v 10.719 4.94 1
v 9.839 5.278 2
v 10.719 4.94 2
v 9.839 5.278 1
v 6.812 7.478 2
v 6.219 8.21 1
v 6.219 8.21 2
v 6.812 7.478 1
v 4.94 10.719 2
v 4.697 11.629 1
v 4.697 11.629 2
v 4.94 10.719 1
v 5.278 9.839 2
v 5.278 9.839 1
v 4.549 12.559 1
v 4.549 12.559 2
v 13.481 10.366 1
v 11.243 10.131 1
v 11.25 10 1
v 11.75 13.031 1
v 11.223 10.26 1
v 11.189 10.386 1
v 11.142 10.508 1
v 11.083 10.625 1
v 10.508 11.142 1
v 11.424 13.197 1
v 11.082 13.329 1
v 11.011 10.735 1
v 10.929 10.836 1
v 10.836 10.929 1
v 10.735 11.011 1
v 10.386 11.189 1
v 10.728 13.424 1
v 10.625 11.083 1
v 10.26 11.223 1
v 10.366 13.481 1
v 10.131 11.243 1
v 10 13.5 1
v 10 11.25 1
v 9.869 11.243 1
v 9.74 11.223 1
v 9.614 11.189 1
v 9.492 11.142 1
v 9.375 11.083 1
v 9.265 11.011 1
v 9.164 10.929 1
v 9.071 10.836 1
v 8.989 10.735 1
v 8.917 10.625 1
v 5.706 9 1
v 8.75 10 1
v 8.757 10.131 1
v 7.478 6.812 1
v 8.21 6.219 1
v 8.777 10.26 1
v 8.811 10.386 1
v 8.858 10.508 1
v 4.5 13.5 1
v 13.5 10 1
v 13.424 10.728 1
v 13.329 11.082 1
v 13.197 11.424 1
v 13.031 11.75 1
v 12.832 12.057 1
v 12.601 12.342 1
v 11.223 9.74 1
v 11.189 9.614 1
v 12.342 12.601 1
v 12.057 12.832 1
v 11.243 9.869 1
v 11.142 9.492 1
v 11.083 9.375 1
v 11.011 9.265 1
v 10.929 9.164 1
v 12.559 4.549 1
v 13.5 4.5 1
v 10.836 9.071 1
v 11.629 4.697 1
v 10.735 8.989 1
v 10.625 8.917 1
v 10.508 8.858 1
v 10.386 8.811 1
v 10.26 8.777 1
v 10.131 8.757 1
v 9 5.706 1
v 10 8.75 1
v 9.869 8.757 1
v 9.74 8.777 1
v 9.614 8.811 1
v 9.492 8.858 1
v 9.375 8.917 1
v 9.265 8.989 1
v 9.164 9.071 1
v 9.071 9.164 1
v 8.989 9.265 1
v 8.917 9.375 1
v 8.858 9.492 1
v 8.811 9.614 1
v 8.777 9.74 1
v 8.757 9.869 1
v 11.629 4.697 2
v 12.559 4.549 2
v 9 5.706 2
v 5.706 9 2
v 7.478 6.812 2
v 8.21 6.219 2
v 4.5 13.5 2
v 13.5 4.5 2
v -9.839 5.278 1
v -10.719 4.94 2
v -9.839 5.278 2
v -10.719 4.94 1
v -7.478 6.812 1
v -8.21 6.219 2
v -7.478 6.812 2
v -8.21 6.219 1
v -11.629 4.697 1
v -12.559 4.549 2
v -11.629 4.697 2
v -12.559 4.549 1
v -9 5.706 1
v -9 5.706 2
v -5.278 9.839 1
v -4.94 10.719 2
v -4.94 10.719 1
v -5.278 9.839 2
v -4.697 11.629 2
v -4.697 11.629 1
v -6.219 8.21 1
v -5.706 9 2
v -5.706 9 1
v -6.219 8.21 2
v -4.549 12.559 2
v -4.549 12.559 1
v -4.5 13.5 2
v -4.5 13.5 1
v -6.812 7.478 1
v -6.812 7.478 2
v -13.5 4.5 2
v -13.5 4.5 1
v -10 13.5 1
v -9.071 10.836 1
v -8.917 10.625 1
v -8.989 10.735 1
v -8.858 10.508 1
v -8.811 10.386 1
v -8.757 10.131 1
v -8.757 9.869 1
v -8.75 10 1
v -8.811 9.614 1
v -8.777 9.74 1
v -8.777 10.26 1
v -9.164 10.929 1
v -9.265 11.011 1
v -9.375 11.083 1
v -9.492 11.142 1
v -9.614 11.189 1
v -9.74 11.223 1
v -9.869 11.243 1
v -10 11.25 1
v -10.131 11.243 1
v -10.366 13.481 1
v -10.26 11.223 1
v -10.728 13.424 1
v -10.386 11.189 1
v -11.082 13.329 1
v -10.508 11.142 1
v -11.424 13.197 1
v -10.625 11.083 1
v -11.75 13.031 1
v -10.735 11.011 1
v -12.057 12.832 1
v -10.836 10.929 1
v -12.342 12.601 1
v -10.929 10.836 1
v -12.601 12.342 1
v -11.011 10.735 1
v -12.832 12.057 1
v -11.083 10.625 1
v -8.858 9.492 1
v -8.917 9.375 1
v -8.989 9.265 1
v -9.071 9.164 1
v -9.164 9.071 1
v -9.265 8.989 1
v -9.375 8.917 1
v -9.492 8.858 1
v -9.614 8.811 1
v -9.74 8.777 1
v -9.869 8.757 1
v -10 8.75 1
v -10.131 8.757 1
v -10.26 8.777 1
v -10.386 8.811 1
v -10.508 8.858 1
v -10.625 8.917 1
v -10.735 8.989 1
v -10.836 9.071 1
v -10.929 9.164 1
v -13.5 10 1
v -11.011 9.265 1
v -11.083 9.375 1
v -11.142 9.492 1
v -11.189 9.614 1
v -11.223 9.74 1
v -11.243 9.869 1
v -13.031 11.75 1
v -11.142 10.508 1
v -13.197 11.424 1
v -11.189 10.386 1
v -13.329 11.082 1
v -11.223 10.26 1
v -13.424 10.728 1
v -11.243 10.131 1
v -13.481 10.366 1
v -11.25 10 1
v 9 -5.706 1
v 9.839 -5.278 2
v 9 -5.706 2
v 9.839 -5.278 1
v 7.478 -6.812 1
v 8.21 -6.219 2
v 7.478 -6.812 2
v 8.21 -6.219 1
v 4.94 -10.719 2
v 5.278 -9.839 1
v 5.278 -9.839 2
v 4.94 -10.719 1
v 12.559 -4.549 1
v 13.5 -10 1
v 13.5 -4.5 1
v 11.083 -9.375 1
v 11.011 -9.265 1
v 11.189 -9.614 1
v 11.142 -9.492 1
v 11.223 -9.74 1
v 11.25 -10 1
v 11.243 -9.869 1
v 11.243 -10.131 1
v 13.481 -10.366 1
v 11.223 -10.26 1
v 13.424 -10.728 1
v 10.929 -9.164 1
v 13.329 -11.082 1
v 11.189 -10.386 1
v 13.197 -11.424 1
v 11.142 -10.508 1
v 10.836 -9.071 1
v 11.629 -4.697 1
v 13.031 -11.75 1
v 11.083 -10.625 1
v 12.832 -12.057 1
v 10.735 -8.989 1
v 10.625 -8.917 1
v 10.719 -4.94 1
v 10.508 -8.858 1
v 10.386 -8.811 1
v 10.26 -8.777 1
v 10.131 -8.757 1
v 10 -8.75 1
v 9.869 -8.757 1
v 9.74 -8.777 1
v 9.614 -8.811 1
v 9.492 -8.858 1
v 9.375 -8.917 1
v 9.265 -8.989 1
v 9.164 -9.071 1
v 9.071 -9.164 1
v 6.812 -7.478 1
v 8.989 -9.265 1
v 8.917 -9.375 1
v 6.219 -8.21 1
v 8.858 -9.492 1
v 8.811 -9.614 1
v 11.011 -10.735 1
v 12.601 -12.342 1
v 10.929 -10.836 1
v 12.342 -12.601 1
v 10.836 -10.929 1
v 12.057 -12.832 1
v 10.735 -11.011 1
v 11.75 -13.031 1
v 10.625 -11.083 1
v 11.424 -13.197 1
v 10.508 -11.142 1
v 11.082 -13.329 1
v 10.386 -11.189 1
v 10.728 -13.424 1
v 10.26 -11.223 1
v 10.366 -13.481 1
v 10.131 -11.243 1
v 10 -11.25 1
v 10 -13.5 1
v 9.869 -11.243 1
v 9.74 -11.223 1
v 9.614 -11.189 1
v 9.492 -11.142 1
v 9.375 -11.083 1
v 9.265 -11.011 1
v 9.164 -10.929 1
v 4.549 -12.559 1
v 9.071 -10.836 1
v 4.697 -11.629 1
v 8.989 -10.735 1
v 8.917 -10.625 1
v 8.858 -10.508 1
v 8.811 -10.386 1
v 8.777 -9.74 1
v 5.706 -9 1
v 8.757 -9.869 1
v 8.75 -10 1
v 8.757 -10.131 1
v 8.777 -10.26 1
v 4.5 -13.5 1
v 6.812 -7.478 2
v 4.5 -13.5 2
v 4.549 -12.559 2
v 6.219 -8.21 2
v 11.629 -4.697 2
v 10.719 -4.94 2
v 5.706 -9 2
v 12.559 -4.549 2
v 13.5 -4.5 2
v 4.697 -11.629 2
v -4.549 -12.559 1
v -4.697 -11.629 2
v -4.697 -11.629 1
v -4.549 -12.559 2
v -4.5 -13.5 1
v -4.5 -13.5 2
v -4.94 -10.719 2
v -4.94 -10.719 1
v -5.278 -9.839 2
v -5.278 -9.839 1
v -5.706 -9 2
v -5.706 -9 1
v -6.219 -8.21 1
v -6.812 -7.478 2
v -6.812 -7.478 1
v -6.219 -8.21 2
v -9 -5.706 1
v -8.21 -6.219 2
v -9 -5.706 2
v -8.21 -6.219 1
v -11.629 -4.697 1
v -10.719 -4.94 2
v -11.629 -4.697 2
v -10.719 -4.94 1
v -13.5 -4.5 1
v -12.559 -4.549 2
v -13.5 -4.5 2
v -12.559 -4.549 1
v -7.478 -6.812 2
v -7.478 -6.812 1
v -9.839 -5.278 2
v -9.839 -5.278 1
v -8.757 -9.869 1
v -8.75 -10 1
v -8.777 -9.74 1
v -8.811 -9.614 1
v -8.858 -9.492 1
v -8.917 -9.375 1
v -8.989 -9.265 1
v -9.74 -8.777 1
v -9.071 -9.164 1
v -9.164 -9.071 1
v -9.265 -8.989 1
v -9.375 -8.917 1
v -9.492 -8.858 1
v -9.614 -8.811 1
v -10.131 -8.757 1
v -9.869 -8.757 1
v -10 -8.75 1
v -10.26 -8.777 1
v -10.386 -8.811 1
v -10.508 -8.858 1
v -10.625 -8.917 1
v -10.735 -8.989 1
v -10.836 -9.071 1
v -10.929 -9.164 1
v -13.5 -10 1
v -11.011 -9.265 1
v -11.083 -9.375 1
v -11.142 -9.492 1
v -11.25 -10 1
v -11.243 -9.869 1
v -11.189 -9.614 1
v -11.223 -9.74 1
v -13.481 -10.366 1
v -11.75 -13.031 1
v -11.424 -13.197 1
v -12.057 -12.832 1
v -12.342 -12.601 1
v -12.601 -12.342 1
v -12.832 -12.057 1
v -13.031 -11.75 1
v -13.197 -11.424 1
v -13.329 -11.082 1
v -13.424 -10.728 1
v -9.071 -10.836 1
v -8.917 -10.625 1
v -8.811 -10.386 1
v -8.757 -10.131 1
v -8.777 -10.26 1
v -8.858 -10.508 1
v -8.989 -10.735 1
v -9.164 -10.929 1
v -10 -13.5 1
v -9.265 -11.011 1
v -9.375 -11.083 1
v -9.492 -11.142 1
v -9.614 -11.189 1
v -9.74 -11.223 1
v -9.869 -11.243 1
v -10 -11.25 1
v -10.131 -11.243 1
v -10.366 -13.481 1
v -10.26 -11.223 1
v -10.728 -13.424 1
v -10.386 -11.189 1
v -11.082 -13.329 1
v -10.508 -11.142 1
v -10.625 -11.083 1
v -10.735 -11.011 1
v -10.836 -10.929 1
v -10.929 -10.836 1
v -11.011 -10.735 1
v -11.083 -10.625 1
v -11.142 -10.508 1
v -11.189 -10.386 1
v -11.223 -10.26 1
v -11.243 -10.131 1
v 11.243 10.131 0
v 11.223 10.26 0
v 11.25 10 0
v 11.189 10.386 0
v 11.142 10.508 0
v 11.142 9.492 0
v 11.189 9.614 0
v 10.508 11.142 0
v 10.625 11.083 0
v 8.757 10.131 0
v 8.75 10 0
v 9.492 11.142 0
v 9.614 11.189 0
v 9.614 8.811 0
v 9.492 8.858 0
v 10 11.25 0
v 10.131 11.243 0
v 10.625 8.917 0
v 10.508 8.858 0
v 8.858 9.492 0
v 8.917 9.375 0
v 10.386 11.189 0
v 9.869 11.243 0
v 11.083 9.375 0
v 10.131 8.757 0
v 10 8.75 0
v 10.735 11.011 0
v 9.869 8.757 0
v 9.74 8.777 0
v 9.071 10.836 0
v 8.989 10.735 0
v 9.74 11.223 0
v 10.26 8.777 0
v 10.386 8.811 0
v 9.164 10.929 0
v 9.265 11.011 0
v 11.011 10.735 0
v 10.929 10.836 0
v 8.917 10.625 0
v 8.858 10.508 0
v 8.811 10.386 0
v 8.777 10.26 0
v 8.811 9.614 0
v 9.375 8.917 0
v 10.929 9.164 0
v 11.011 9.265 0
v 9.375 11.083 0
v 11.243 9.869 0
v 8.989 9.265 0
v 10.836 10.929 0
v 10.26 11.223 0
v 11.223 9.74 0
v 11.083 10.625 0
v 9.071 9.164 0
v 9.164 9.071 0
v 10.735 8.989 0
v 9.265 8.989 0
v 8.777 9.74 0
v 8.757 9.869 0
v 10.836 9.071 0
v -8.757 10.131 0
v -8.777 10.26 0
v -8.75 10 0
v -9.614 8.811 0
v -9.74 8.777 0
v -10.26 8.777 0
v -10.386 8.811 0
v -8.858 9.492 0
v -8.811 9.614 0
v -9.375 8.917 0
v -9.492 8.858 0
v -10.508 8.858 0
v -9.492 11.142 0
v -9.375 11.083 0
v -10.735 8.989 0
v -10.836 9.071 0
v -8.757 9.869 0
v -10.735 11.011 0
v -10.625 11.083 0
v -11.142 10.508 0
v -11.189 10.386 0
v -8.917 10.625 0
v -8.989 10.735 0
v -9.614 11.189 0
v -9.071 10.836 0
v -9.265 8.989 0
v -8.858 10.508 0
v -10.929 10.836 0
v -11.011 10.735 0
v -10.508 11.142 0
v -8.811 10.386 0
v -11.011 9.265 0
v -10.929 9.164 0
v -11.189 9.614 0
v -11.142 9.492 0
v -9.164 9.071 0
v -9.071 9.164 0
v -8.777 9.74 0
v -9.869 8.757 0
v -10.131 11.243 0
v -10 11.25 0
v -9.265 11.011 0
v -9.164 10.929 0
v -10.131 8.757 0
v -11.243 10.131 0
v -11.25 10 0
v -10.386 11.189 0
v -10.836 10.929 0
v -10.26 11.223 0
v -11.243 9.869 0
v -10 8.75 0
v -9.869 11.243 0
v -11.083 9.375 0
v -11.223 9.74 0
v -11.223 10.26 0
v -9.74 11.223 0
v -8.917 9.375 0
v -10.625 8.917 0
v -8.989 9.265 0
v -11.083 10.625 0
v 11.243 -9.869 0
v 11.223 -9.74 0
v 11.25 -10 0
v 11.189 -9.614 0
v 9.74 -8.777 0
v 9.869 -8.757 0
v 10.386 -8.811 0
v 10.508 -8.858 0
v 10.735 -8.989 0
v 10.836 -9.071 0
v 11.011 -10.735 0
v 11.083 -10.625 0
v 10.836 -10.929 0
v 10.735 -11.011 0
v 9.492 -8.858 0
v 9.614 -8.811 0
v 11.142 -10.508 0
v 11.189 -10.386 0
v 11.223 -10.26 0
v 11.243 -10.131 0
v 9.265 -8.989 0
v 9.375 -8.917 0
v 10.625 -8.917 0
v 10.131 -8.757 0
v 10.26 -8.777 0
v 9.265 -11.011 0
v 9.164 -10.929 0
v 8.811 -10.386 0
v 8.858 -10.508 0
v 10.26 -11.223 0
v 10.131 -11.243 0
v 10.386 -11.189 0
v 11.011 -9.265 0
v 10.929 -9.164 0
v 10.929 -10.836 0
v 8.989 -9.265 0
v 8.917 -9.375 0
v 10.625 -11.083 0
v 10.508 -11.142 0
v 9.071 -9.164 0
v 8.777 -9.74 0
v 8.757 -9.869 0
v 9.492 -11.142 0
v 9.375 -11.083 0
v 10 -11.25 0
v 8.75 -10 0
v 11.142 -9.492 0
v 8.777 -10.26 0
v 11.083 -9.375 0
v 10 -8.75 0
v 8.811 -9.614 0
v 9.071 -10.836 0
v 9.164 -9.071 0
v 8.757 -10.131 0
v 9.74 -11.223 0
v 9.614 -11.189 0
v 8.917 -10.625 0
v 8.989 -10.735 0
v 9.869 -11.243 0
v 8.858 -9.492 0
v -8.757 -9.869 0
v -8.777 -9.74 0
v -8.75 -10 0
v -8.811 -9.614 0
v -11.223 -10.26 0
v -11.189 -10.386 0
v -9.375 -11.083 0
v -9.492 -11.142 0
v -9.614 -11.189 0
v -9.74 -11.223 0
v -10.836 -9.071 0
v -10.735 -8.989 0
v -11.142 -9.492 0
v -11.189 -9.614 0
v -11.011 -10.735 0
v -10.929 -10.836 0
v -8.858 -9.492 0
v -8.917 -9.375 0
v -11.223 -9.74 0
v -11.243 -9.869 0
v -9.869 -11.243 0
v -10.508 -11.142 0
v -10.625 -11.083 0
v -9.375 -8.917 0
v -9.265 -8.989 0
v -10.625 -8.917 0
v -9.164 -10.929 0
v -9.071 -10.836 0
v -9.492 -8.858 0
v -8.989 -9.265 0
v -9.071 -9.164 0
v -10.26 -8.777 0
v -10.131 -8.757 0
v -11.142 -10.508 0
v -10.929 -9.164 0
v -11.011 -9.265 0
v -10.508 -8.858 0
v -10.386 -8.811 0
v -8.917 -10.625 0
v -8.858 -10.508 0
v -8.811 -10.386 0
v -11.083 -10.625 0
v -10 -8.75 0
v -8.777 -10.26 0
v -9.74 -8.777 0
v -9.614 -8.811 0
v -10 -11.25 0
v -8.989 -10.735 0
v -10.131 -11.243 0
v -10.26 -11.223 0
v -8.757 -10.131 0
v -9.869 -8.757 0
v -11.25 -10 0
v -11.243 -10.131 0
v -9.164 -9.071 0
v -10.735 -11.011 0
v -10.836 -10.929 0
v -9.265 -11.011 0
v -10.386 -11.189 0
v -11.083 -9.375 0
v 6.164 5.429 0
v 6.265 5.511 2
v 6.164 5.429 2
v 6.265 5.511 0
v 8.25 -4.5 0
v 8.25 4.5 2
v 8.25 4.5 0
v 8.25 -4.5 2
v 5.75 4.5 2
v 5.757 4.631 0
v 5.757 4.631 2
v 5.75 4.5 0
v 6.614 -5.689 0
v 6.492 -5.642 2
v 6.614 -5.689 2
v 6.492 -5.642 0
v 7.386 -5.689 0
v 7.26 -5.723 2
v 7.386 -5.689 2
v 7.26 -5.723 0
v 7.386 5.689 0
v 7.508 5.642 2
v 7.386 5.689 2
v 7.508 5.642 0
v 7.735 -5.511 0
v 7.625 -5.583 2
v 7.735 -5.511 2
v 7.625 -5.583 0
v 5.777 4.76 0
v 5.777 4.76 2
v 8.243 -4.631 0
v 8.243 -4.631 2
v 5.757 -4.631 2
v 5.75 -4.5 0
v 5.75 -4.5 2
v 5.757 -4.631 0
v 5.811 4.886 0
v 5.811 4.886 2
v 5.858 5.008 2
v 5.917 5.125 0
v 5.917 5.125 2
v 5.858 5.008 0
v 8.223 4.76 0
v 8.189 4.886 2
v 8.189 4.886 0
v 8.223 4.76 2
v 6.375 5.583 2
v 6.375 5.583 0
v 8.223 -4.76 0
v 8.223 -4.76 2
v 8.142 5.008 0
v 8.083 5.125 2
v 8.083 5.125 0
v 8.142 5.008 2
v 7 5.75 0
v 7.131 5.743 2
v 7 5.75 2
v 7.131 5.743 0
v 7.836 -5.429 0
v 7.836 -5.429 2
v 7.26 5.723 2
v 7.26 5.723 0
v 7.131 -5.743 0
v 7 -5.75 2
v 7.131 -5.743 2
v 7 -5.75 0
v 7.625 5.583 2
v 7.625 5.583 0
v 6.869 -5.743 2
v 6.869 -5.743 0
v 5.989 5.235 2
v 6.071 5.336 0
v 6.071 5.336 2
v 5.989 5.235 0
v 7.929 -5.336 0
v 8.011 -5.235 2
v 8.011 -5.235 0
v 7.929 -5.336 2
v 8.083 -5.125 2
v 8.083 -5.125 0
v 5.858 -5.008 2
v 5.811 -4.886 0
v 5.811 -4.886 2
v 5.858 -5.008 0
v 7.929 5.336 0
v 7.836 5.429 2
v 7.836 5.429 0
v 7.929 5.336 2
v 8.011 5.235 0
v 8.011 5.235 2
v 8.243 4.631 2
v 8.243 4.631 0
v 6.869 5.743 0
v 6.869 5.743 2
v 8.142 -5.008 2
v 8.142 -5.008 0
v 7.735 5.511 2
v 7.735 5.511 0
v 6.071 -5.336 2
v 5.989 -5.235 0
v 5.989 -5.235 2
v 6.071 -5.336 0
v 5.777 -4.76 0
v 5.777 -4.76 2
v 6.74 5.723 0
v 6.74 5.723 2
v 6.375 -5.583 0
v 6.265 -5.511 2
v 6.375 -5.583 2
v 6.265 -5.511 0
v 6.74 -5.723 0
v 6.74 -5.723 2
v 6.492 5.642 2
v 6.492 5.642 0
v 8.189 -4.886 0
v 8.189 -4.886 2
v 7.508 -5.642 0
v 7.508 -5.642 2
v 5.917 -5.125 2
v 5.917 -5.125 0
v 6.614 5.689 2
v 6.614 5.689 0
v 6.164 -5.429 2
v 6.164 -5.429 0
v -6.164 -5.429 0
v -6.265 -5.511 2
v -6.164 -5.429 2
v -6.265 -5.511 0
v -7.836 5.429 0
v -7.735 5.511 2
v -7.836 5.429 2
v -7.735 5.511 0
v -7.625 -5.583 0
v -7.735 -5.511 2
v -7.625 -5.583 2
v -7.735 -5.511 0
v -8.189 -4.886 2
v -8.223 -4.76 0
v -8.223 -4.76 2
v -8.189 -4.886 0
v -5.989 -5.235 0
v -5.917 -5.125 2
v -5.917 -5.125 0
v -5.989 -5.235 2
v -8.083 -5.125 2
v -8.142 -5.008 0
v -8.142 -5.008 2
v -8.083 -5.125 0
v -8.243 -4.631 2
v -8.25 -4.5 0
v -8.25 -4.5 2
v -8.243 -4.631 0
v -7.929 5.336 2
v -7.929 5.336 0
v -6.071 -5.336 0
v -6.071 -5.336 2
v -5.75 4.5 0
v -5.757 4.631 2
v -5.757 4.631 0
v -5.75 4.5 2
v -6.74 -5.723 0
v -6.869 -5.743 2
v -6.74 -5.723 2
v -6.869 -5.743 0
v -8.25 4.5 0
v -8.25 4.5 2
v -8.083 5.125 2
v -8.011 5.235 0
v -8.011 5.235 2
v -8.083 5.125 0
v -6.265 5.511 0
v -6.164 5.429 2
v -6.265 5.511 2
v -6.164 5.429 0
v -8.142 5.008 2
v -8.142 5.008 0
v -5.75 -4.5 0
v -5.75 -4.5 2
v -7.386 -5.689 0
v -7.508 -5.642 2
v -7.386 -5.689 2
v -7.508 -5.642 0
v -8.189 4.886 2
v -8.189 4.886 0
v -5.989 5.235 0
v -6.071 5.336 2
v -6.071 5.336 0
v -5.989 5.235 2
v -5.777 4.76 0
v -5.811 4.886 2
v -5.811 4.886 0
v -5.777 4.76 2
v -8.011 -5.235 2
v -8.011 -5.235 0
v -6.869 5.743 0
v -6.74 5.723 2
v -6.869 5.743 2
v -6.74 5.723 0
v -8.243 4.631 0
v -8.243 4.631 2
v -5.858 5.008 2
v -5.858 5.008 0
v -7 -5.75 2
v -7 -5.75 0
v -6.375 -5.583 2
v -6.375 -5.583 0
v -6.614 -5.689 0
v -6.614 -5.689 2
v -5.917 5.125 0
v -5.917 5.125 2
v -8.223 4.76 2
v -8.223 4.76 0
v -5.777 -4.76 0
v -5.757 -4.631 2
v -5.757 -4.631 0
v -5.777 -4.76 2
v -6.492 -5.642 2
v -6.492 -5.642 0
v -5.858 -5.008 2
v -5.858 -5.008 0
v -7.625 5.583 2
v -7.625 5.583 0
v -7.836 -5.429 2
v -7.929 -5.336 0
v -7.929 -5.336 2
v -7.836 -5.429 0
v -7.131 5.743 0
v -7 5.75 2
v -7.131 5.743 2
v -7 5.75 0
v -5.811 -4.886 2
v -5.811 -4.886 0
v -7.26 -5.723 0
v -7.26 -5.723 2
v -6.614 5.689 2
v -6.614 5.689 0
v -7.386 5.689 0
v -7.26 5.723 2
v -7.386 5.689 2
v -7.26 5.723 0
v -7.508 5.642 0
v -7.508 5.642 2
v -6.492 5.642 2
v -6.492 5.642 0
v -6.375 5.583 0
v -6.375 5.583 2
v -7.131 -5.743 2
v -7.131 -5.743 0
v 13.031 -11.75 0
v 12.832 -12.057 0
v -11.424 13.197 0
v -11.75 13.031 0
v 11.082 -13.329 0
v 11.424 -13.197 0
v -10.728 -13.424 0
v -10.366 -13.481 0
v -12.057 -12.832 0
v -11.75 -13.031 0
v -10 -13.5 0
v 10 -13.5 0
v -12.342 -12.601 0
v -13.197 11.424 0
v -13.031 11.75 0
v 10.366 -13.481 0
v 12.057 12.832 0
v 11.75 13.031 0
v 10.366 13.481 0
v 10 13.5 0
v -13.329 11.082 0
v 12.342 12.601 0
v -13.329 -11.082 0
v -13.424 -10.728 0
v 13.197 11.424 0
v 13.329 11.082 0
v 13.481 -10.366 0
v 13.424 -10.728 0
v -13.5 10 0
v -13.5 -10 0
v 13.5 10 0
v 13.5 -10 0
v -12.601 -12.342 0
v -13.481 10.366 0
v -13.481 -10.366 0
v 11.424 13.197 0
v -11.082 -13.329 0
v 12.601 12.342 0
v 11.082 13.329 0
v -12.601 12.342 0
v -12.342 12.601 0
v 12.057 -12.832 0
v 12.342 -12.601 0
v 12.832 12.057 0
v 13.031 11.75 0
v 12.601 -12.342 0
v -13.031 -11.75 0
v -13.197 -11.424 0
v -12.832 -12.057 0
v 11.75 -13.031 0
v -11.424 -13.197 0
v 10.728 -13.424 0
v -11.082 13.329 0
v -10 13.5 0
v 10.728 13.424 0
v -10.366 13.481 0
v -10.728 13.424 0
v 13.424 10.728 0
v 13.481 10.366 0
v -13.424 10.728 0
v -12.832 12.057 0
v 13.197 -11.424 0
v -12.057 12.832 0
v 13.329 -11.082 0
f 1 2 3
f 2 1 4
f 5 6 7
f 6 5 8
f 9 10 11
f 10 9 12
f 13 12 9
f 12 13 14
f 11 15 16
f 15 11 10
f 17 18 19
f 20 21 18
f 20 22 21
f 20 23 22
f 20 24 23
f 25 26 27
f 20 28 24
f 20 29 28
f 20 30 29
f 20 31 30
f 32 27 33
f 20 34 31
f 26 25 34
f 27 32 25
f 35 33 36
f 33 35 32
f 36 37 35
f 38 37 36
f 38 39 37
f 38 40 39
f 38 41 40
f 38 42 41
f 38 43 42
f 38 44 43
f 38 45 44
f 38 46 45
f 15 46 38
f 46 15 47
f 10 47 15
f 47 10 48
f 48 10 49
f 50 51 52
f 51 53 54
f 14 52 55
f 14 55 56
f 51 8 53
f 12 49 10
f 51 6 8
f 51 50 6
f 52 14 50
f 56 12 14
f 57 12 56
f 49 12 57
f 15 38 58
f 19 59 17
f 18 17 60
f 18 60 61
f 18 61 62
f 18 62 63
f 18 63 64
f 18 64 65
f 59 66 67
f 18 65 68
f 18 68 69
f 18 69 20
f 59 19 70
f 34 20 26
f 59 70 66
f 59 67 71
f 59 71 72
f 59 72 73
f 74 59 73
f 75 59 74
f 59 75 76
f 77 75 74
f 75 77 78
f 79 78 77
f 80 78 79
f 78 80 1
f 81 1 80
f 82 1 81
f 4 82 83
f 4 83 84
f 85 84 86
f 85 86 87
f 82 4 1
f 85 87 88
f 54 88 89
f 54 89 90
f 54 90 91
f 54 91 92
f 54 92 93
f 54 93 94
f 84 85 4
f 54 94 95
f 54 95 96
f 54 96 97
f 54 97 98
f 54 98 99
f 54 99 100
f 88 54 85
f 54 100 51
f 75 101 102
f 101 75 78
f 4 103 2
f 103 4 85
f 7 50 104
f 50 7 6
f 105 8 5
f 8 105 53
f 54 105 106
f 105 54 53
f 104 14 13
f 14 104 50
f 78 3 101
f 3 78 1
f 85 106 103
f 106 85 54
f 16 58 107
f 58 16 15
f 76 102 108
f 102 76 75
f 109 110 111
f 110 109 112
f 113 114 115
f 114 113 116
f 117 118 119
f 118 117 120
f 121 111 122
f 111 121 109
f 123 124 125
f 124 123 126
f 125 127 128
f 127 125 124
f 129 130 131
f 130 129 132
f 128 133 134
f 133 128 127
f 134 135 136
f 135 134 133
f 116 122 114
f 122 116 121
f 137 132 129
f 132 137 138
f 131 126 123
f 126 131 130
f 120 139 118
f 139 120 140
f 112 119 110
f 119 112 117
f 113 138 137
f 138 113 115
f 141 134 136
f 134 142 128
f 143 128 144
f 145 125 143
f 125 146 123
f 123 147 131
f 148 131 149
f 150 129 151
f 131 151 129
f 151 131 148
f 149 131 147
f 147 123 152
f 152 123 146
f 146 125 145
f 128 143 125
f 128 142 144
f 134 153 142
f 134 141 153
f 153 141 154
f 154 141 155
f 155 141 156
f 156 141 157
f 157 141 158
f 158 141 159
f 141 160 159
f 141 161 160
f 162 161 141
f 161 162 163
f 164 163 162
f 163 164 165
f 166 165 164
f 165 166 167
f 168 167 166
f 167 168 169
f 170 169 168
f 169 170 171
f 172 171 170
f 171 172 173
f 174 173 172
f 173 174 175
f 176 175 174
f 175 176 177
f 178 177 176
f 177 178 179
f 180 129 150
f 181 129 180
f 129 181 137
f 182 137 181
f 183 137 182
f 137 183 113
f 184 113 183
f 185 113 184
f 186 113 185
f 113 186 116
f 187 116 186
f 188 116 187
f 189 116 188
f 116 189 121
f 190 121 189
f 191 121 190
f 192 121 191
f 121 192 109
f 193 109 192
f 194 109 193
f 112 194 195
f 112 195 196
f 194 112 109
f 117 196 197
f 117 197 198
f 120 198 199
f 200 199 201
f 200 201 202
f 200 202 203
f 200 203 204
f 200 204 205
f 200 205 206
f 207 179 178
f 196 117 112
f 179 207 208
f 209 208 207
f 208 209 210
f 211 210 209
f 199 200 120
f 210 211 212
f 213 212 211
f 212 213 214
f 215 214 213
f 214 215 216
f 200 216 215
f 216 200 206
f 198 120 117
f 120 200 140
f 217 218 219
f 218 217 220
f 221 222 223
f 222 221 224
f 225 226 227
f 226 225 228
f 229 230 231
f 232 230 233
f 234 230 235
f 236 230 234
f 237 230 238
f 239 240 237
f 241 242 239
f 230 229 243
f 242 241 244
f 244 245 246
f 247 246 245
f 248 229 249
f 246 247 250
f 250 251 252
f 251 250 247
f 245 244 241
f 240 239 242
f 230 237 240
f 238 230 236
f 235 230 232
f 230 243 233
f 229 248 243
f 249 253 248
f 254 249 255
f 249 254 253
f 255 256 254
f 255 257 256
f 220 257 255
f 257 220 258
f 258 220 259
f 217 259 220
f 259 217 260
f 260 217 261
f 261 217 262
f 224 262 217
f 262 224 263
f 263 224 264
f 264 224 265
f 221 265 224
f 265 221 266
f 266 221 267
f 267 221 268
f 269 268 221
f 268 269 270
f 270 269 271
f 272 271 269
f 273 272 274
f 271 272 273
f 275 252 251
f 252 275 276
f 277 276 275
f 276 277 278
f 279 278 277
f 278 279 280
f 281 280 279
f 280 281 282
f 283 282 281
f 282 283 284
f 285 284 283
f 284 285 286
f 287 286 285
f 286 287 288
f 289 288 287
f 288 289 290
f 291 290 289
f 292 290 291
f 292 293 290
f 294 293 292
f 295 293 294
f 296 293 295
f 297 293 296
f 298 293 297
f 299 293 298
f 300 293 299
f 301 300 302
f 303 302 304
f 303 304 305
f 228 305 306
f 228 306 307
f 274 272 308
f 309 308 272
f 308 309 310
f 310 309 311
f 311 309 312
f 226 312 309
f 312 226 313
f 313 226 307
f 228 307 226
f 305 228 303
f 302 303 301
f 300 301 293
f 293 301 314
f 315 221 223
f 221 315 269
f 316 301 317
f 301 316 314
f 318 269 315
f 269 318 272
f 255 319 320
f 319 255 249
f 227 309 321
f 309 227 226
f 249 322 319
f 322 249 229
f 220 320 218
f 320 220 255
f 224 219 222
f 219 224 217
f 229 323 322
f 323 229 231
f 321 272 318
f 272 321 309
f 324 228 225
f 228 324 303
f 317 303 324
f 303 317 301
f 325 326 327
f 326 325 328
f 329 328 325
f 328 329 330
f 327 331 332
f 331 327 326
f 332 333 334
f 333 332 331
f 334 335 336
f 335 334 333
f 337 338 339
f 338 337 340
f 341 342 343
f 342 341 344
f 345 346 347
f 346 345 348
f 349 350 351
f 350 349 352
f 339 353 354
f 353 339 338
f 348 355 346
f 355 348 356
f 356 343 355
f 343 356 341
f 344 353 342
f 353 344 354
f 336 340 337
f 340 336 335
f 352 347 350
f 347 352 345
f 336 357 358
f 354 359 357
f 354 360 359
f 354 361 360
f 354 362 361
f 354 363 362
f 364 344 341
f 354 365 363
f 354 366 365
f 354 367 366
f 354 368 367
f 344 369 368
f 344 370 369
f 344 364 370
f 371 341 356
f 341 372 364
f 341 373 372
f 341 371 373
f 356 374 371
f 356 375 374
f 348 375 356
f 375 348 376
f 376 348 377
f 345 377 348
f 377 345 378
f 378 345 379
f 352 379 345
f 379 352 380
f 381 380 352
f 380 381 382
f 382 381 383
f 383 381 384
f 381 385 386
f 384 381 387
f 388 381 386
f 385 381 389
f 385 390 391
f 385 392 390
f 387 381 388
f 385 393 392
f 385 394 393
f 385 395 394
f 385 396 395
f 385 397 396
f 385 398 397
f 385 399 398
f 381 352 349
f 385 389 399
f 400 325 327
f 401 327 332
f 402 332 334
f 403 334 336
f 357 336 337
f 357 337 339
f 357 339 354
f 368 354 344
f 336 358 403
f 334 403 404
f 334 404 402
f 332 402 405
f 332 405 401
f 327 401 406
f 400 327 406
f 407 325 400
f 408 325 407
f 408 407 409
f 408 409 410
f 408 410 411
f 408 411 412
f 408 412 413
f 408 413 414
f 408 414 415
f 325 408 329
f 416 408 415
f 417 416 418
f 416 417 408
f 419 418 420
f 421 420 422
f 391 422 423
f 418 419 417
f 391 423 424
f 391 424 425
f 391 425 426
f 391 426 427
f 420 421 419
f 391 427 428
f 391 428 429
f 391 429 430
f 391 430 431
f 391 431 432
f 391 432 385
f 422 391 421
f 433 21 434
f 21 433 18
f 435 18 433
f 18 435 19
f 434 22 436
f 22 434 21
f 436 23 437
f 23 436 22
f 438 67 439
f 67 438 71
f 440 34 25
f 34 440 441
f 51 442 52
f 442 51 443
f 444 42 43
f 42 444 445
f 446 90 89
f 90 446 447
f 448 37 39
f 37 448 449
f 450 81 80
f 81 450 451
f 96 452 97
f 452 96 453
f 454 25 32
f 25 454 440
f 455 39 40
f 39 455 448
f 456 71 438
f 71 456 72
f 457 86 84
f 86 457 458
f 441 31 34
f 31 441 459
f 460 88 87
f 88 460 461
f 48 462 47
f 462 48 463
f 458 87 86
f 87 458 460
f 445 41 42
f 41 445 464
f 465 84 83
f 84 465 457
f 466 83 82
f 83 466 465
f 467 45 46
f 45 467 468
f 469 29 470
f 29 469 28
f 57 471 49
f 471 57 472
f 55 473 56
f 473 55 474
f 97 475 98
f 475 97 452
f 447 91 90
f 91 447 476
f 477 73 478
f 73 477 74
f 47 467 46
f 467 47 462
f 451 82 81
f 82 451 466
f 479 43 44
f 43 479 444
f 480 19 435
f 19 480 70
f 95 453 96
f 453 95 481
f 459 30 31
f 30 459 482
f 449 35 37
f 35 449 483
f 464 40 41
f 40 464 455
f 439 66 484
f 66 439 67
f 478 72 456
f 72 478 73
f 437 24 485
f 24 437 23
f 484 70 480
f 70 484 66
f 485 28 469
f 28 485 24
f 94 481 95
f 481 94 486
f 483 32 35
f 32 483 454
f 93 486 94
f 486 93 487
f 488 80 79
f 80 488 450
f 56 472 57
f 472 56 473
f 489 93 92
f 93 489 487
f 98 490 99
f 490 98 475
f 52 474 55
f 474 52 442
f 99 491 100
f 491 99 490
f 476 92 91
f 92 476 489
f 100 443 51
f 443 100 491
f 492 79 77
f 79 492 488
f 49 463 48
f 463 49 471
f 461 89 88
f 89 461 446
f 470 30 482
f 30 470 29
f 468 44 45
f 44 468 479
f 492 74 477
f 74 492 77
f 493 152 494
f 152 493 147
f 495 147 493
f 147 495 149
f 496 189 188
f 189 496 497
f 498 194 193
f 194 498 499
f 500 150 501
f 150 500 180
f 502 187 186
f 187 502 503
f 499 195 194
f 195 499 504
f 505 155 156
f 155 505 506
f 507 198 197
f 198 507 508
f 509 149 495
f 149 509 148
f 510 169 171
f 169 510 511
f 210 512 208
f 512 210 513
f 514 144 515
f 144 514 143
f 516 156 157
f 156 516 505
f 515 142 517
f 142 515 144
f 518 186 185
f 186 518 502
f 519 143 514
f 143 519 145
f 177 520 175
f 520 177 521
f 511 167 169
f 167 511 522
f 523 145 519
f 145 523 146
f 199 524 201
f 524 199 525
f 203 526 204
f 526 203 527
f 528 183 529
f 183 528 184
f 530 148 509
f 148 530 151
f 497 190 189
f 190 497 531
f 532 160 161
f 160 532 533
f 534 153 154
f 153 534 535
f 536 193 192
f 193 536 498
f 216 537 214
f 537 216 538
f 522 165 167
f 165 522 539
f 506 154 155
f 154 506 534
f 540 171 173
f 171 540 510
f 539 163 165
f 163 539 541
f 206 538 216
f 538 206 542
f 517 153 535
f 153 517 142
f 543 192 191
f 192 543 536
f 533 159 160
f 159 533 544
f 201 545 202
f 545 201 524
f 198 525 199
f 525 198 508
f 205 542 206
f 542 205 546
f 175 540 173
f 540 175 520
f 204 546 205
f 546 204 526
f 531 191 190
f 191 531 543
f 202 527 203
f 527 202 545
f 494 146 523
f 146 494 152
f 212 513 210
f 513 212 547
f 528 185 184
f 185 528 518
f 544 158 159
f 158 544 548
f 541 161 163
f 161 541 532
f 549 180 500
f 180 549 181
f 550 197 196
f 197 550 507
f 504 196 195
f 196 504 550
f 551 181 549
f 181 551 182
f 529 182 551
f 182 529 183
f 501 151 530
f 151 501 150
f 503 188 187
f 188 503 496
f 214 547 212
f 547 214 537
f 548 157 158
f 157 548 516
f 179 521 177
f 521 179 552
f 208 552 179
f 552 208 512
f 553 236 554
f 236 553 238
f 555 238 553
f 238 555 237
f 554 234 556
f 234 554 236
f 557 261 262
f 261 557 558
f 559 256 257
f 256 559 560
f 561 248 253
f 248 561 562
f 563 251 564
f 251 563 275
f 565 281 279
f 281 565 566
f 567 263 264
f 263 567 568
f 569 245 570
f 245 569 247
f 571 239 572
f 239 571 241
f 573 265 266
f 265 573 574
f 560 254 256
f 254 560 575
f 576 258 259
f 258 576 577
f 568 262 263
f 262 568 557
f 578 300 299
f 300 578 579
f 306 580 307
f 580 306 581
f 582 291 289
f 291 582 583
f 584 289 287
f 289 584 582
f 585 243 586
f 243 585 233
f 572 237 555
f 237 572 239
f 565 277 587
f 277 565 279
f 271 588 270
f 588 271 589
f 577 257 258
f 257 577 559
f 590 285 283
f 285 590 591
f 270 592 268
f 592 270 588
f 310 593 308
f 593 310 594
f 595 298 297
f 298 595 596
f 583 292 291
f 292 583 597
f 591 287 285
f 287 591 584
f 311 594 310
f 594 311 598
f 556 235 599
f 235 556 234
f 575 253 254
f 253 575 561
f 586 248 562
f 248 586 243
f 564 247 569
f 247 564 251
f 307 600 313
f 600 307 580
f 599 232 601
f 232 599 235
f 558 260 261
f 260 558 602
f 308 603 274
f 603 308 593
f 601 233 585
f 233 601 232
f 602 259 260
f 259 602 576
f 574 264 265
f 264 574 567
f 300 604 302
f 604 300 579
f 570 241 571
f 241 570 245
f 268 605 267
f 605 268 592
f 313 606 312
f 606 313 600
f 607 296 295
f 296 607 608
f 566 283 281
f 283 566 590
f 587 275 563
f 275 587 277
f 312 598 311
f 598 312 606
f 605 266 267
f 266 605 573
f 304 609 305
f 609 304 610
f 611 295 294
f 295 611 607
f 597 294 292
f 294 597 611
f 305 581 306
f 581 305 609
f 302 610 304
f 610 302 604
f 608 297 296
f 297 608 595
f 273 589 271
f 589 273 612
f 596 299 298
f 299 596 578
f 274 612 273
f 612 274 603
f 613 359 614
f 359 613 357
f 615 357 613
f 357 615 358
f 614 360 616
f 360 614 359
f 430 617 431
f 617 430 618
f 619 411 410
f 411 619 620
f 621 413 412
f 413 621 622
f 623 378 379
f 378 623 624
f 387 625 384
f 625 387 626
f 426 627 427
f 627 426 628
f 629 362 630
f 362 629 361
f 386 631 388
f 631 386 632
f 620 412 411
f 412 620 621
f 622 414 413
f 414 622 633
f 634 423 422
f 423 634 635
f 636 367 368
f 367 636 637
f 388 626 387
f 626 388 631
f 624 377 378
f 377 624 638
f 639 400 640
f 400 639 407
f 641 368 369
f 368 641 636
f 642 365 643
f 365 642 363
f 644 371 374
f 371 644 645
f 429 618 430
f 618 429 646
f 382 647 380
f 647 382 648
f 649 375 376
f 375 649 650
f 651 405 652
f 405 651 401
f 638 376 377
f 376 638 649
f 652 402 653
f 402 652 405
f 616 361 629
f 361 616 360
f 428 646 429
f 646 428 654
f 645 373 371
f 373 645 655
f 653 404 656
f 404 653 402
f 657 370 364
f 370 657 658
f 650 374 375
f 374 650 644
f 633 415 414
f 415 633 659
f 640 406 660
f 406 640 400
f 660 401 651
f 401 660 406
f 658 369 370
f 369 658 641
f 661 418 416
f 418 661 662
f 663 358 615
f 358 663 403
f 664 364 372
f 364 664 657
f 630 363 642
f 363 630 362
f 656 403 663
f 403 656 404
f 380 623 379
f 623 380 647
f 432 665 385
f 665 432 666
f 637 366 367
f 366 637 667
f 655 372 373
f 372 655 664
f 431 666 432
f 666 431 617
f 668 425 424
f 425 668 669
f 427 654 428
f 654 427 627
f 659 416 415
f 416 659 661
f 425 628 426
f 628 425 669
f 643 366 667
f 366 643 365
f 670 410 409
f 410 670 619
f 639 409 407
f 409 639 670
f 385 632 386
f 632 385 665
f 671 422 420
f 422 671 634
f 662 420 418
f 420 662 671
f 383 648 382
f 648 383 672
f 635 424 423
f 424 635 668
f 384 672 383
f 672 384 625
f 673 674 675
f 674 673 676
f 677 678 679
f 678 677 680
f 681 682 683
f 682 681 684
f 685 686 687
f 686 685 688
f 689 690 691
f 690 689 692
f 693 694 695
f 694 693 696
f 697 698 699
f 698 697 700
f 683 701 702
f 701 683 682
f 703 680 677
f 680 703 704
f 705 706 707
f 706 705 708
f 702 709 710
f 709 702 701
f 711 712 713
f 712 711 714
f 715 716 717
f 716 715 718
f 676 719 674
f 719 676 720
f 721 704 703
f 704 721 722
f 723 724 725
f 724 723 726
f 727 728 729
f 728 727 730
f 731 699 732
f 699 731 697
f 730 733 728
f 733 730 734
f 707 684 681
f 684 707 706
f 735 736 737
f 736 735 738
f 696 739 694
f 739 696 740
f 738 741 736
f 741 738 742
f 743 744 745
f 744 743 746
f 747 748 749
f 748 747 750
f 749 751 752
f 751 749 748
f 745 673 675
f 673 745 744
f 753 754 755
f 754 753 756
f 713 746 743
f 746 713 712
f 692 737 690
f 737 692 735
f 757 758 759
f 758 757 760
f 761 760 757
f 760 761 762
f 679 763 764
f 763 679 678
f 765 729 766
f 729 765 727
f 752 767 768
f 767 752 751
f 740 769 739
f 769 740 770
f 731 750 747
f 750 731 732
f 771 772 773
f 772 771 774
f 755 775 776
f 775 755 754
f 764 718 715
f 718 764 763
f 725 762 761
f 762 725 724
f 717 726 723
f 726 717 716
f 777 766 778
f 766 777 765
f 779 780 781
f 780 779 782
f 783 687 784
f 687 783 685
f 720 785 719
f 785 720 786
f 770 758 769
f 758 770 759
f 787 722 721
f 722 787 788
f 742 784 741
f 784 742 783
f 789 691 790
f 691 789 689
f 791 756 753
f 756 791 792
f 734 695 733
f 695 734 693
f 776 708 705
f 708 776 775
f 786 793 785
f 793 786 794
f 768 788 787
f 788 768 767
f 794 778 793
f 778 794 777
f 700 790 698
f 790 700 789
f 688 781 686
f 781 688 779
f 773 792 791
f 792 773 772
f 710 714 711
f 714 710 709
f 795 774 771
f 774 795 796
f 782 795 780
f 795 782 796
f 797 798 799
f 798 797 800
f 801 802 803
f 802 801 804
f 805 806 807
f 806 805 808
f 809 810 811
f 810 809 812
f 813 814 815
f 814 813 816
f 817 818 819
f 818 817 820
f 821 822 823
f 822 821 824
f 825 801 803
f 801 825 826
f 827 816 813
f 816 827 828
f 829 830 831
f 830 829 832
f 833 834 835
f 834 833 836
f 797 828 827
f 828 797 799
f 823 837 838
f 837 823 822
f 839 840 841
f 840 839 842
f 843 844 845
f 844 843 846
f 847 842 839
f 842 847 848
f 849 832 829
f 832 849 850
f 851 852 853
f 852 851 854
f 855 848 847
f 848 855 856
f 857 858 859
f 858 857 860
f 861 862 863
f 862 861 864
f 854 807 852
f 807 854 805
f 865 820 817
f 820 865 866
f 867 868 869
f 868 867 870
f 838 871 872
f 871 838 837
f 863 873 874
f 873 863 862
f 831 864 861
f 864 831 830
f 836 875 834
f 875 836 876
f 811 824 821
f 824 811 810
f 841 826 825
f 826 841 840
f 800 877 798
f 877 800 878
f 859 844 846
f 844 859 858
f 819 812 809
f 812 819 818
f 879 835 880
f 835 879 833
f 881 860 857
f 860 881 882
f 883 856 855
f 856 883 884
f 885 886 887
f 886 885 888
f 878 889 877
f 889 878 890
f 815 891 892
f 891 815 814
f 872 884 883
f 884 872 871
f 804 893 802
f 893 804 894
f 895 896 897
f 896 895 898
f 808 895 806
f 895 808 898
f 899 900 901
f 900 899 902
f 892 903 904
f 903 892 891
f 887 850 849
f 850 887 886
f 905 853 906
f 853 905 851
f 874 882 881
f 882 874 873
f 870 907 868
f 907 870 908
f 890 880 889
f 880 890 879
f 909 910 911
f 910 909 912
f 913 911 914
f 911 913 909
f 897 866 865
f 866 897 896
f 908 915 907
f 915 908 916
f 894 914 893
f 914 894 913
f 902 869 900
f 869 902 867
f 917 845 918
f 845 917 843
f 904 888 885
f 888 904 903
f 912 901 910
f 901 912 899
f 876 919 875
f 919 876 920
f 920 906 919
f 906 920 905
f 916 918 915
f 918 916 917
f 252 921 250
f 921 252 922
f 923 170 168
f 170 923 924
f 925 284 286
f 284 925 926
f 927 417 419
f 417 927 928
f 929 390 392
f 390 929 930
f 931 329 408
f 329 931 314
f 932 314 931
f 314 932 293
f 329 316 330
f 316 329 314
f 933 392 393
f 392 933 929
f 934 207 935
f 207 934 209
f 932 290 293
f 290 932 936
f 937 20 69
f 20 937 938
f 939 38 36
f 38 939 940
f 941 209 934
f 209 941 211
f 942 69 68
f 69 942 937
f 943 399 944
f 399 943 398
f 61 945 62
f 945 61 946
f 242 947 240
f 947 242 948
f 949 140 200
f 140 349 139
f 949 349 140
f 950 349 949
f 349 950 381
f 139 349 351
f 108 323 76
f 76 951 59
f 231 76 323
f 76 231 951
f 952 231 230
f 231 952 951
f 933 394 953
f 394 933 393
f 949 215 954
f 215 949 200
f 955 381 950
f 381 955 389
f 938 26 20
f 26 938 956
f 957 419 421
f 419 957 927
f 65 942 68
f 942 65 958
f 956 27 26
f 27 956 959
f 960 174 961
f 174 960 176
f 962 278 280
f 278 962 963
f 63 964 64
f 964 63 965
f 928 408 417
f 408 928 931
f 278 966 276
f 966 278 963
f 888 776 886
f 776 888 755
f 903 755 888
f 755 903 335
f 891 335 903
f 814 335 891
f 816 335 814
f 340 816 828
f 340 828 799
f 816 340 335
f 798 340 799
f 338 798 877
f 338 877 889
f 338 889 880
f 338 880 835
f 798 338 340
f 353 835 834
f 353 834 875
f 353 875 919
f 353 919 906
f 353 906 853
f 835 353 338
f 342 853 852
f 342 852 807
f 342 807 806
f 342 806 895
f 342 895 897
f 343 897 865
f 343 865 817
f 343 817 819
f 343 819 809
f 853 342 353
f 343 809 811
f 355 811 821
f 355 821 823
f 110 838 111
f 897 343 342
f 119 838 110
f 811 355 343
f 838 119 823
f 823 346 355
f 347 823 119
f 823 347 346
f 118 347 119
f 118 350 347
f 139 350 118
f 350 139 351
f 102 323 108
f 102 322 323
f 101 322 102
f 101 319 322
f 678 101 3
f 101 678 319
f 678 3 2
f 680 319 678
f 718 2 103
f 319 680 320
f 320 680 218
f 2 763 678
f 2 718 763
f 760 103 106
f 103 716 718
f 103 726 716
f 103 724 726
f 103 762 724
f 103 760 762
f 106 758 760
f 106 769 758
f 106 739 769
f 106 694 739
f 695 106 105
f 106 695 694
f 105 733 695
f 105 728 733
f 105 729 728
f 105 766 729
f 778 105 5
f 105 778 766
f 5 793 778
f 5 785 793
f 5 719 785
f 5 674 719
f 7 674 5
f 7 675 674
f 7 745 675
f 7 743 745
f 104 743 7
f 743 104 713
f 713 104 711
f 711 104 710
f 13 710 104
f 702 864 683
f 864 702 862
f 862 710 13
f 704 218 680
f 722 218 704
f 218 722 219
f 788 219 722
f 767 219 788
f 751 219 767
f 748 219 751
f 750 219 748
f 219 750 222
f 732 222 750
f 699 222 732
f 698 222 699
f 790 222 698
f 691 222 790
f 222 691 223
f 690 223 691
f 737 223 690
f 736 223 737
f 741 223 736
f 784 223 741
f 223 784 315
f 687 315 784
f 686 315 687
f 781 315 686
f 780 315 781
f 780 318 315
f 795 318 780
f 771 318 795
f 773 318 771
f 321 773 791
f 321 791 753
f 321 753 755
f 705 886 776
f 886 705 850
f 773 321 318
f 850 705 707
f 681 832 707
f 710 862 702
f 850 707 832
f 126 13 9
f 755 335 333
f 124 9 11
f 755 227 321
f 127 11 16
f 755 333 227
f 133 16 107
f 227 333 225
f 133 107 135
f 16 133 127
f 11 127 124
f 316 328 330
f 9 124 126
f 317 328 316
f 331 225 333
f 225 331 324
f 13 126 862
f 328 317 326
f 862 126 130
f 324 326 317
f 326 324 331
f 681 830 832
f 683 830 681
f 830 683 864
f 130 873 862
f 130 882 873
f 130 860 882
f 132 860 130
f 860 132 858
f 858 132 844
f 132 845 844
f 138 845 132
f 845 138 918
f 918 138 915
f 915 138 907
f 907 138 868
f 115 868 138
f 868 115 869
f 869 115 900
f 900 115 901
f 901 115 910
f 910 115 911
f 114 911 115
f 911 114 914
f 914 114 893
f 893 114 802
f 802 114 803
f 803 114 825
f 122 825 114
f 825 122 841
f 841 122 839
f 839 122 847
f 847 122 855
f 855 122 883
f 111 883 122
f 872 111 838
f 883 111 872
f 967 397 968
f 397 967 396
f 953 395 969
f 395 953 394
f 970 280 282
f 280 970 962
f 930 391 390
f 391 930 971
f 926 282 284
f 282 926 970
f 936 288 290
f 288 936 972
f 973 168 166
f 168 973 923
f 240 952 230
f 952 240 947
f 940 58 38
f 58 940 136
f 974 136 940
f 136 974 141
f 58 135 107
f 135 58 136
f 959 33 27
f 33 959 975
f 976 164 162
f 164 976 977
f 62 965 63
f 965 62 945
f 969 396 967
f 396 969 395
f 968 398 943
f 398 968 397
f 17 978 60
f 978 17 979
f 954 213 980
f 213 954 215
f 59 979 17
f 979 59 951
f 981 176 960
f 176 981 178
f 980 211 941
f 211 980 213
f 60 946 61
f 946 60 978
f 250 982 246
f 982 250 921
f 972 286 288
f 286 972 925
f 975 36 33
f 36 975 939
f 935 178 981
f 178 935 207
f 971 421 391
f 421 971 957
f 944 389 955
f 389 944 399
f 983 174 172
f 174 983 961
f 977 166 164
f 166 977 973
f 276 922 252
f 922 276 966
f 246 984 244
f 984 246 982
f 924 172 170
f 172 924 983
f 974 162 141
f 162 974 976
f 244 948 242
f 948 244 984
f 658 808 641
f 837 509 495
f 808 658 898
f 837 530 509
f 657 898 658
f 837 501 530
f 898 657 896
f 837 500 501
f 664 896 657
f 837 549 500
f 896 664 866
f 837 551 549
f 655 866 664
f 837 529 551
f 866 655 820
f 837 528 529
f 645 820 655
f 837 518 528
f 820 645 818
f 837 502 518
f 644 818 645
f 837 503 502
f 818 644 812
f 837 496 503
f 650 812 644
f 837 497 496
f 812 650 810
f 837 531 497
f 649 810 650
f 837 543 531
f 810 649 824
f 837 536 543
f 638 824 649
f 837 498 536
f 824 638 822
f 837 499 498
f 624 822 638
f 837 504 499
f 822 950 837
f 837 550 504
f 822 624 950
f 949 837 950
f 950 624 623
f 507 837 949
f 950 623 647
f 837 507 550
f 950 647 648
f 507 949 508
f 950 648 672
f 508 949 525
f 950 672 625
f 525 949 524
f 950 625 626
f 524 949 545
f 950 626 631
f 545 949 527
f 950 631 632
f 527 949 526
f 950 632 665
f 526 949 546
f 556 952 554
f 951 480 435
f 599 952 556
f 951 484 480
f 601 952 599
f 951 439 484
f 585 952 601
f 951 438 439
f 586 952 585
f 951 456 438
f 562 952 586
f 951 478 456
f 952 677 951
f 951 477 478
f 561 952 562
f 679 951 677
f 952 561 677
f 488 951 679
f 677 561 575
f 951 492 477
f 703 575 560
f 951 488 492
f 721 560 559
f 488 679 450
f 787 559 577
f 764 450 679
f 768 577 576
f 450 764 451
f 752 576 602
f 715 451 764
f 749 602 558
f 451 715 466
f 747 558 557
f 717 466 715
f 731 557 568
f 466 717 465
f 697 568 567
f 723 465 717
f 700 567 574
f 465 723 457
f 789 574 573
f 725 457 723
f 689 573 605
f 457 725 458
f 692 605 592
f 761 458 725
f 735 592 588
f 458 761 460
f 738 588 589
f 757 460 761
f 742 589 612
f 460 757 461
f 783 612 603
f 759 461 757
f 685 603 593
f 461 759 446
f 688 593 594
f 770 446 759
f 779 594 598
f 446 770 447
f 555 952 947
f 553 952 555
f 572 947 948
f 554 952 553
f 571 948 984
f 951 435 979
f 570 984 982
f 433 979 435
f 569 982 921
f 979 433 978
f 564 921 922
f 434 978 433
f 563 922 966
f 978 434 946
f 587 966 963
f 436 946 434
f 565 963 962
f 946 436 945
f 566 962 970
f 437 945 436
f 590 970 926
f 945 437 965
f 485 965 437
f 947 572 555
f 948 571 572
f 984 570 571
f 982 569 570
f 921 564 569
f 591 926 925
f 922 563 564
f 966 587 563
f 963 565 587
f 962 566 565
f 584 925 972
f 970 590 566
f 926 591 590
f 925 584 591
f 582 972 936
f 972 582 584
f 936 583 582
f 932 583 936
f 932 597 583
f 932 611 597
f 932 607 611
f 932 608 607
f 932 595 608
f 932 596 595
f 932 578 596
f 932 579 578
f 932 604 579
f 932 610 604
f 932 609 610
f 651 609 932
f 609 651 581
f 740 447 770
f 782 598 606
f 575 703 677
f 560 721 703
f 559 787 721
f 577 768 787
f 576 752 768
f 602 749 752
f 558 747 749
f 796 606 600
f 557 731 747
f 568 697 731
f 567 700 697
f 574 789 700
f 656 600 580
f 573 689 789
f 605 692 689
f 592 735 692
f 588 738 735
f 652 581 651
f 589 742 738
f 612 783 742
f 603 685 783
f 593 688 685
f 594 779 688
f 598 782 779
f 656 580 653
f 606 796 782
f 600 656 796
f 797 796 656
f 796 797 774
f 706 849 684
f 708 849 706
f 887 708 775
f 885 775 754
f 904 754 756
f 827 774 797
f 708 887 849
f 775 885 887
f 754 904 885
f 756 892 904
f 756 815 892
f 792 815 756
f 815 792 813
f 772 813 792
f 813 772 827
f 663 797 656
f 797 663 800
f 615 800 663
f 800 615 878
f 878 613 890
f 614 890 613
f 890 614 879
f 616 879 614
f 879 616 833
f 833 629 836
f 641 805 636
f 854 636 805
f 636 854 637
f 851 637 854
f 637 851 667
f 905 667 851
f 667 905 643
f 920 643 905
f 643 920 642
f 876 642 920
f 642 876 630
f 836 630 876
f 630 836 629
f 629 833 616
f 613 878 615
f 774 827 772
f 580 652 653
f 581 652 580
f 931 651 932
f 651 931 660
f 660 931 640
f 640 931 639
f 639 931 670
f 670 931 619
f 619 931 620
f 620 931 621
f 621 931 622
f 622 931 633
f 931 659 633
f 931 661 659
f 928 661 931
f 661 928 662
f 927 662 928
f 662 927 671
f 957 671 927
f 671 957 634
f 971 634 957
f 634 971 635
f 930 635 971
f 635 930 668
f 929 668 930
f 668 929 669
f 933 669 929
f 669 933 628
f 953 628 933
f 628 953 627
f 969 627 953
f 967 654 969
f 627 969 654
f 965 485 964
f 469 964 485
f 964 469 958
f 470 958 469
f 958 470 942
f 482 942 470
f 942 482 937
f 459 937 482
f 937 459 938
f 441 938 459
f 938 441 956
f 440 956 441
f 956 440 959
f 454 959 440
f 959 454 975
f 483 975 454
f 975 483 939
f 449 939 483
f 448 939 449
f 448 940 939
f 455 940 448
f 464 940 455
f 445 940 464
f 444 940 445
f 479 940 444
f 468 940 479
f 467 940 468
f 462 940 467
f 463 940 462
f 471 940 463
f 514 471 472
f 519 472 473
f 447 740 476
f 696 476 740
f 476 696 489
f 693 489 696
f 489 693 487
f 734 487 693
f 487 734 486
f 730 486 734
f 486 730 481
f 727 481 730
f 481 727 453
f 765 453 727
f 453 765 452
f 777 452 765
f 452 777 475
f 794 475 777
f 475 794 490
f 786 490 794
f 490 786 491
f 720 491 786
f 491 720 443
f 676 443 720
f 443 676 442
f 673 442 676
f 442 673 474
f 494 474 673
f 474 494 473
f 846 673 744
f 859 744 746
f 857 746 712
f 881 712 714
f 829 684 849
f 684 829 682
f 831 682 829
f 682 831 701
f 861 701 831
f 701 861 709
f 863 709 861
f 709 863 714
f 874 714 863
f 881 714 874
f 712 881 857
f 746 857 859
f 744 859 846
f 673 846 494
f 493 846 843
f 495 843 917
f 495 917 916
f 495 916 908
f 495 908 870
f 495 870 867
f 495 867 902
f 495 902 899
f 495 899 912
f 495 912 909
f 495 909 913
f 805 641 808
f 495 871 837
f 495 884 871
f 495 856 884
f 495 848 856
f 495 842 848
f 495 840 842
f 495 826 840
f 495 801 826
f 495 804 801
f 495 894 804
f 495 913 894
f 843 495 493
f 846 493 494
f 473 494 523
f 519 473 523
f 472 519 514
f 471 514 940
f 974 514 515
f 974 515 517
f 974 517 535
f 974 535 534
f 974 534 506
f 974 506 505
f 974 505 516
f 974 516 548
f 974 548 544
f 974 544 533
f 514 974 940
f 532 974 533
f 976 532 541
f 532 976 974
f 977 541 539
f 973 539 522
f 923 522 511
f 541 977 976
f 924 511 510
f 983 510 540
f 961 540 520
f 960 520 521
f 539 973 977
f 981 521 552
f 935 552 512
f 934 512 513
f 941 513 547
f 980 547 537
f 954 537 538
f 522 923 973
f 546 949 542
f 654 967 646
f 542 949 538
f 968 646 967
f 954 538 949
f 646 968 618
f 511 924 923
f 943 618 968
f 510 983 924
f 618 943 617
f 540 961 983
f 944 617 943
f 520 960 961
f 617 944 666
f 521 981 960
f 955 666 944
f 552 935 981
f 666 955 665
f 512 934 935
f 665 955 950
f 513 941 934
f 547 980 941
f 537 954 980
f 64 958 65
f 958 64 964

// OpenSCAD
$fn = 60;

corner_r = 3.5;
dxy = (27/2)-corner_r;
h=2;
screw_d = 2.5;
slot_dx = dxy-3;
slot_dy = dxy-5.5;

cutout_r = 9;
cutout_dxy = (27/2);

difference() 
{
  hull() {
    translate([dxy,dxy,0]) cylinder(r=corner_r, h=h);
    translate([-dxy,dxy,0]) cylinder(r=corner_r, h=h);
    translate([dxy,-dxy,0]) cylinder(r=corner_r, h=h);
    translate([-dxy,-dxy,0]) cylinder(r=corner_r, h=h);
  }

  // screw holes
  translate([0,0,-0.5]) {
    translate([dxy,dxy]) cylinder(d=screw_d, h=h+1);
    translate([-dxy,dxy]) cylinder(d=screw_d, h=h+1);
    translate([dxy,-dxy]) cylinder(d=screw_d, h=h+1);
    translate([-dxy,-dxy]) cylinder(d=screw_d, h=h+1);

    // screw head cutouts
    translate([0,0,1.5]) {
      translate([cutout_dxy,cutout_dxy]) cylinder(r=cutout_r, h=h+1);
      translate([-cutout_dxy,cutout_dxy]) cylinder(r=cutout_r, h=h+1);
      translate([cutout_dxy,-cutout_dxy]) cylinder(r=cutout_r, h=h+1);
      translate([-cutout_dxy,-cutout_dxy]) cylinder(r=cutout_r, h=h+1);
    }
    

    // slots
    hull() {
      translate([slot_dx,slot_dy]) cylinder(d=screw_d, h=h+1);
      translate([slot_dx,-slot_dy]) cylinder(d=screw_d, h=h+1);
    }

    hull() {
      translate([-slot_dx,slot_dy]) cylinder(d=screw_d, h=h+1);
      translate([-slot_dx,-slot_dy]) cylinder(d=screw_d, h=h+1);
    }
  }
}
